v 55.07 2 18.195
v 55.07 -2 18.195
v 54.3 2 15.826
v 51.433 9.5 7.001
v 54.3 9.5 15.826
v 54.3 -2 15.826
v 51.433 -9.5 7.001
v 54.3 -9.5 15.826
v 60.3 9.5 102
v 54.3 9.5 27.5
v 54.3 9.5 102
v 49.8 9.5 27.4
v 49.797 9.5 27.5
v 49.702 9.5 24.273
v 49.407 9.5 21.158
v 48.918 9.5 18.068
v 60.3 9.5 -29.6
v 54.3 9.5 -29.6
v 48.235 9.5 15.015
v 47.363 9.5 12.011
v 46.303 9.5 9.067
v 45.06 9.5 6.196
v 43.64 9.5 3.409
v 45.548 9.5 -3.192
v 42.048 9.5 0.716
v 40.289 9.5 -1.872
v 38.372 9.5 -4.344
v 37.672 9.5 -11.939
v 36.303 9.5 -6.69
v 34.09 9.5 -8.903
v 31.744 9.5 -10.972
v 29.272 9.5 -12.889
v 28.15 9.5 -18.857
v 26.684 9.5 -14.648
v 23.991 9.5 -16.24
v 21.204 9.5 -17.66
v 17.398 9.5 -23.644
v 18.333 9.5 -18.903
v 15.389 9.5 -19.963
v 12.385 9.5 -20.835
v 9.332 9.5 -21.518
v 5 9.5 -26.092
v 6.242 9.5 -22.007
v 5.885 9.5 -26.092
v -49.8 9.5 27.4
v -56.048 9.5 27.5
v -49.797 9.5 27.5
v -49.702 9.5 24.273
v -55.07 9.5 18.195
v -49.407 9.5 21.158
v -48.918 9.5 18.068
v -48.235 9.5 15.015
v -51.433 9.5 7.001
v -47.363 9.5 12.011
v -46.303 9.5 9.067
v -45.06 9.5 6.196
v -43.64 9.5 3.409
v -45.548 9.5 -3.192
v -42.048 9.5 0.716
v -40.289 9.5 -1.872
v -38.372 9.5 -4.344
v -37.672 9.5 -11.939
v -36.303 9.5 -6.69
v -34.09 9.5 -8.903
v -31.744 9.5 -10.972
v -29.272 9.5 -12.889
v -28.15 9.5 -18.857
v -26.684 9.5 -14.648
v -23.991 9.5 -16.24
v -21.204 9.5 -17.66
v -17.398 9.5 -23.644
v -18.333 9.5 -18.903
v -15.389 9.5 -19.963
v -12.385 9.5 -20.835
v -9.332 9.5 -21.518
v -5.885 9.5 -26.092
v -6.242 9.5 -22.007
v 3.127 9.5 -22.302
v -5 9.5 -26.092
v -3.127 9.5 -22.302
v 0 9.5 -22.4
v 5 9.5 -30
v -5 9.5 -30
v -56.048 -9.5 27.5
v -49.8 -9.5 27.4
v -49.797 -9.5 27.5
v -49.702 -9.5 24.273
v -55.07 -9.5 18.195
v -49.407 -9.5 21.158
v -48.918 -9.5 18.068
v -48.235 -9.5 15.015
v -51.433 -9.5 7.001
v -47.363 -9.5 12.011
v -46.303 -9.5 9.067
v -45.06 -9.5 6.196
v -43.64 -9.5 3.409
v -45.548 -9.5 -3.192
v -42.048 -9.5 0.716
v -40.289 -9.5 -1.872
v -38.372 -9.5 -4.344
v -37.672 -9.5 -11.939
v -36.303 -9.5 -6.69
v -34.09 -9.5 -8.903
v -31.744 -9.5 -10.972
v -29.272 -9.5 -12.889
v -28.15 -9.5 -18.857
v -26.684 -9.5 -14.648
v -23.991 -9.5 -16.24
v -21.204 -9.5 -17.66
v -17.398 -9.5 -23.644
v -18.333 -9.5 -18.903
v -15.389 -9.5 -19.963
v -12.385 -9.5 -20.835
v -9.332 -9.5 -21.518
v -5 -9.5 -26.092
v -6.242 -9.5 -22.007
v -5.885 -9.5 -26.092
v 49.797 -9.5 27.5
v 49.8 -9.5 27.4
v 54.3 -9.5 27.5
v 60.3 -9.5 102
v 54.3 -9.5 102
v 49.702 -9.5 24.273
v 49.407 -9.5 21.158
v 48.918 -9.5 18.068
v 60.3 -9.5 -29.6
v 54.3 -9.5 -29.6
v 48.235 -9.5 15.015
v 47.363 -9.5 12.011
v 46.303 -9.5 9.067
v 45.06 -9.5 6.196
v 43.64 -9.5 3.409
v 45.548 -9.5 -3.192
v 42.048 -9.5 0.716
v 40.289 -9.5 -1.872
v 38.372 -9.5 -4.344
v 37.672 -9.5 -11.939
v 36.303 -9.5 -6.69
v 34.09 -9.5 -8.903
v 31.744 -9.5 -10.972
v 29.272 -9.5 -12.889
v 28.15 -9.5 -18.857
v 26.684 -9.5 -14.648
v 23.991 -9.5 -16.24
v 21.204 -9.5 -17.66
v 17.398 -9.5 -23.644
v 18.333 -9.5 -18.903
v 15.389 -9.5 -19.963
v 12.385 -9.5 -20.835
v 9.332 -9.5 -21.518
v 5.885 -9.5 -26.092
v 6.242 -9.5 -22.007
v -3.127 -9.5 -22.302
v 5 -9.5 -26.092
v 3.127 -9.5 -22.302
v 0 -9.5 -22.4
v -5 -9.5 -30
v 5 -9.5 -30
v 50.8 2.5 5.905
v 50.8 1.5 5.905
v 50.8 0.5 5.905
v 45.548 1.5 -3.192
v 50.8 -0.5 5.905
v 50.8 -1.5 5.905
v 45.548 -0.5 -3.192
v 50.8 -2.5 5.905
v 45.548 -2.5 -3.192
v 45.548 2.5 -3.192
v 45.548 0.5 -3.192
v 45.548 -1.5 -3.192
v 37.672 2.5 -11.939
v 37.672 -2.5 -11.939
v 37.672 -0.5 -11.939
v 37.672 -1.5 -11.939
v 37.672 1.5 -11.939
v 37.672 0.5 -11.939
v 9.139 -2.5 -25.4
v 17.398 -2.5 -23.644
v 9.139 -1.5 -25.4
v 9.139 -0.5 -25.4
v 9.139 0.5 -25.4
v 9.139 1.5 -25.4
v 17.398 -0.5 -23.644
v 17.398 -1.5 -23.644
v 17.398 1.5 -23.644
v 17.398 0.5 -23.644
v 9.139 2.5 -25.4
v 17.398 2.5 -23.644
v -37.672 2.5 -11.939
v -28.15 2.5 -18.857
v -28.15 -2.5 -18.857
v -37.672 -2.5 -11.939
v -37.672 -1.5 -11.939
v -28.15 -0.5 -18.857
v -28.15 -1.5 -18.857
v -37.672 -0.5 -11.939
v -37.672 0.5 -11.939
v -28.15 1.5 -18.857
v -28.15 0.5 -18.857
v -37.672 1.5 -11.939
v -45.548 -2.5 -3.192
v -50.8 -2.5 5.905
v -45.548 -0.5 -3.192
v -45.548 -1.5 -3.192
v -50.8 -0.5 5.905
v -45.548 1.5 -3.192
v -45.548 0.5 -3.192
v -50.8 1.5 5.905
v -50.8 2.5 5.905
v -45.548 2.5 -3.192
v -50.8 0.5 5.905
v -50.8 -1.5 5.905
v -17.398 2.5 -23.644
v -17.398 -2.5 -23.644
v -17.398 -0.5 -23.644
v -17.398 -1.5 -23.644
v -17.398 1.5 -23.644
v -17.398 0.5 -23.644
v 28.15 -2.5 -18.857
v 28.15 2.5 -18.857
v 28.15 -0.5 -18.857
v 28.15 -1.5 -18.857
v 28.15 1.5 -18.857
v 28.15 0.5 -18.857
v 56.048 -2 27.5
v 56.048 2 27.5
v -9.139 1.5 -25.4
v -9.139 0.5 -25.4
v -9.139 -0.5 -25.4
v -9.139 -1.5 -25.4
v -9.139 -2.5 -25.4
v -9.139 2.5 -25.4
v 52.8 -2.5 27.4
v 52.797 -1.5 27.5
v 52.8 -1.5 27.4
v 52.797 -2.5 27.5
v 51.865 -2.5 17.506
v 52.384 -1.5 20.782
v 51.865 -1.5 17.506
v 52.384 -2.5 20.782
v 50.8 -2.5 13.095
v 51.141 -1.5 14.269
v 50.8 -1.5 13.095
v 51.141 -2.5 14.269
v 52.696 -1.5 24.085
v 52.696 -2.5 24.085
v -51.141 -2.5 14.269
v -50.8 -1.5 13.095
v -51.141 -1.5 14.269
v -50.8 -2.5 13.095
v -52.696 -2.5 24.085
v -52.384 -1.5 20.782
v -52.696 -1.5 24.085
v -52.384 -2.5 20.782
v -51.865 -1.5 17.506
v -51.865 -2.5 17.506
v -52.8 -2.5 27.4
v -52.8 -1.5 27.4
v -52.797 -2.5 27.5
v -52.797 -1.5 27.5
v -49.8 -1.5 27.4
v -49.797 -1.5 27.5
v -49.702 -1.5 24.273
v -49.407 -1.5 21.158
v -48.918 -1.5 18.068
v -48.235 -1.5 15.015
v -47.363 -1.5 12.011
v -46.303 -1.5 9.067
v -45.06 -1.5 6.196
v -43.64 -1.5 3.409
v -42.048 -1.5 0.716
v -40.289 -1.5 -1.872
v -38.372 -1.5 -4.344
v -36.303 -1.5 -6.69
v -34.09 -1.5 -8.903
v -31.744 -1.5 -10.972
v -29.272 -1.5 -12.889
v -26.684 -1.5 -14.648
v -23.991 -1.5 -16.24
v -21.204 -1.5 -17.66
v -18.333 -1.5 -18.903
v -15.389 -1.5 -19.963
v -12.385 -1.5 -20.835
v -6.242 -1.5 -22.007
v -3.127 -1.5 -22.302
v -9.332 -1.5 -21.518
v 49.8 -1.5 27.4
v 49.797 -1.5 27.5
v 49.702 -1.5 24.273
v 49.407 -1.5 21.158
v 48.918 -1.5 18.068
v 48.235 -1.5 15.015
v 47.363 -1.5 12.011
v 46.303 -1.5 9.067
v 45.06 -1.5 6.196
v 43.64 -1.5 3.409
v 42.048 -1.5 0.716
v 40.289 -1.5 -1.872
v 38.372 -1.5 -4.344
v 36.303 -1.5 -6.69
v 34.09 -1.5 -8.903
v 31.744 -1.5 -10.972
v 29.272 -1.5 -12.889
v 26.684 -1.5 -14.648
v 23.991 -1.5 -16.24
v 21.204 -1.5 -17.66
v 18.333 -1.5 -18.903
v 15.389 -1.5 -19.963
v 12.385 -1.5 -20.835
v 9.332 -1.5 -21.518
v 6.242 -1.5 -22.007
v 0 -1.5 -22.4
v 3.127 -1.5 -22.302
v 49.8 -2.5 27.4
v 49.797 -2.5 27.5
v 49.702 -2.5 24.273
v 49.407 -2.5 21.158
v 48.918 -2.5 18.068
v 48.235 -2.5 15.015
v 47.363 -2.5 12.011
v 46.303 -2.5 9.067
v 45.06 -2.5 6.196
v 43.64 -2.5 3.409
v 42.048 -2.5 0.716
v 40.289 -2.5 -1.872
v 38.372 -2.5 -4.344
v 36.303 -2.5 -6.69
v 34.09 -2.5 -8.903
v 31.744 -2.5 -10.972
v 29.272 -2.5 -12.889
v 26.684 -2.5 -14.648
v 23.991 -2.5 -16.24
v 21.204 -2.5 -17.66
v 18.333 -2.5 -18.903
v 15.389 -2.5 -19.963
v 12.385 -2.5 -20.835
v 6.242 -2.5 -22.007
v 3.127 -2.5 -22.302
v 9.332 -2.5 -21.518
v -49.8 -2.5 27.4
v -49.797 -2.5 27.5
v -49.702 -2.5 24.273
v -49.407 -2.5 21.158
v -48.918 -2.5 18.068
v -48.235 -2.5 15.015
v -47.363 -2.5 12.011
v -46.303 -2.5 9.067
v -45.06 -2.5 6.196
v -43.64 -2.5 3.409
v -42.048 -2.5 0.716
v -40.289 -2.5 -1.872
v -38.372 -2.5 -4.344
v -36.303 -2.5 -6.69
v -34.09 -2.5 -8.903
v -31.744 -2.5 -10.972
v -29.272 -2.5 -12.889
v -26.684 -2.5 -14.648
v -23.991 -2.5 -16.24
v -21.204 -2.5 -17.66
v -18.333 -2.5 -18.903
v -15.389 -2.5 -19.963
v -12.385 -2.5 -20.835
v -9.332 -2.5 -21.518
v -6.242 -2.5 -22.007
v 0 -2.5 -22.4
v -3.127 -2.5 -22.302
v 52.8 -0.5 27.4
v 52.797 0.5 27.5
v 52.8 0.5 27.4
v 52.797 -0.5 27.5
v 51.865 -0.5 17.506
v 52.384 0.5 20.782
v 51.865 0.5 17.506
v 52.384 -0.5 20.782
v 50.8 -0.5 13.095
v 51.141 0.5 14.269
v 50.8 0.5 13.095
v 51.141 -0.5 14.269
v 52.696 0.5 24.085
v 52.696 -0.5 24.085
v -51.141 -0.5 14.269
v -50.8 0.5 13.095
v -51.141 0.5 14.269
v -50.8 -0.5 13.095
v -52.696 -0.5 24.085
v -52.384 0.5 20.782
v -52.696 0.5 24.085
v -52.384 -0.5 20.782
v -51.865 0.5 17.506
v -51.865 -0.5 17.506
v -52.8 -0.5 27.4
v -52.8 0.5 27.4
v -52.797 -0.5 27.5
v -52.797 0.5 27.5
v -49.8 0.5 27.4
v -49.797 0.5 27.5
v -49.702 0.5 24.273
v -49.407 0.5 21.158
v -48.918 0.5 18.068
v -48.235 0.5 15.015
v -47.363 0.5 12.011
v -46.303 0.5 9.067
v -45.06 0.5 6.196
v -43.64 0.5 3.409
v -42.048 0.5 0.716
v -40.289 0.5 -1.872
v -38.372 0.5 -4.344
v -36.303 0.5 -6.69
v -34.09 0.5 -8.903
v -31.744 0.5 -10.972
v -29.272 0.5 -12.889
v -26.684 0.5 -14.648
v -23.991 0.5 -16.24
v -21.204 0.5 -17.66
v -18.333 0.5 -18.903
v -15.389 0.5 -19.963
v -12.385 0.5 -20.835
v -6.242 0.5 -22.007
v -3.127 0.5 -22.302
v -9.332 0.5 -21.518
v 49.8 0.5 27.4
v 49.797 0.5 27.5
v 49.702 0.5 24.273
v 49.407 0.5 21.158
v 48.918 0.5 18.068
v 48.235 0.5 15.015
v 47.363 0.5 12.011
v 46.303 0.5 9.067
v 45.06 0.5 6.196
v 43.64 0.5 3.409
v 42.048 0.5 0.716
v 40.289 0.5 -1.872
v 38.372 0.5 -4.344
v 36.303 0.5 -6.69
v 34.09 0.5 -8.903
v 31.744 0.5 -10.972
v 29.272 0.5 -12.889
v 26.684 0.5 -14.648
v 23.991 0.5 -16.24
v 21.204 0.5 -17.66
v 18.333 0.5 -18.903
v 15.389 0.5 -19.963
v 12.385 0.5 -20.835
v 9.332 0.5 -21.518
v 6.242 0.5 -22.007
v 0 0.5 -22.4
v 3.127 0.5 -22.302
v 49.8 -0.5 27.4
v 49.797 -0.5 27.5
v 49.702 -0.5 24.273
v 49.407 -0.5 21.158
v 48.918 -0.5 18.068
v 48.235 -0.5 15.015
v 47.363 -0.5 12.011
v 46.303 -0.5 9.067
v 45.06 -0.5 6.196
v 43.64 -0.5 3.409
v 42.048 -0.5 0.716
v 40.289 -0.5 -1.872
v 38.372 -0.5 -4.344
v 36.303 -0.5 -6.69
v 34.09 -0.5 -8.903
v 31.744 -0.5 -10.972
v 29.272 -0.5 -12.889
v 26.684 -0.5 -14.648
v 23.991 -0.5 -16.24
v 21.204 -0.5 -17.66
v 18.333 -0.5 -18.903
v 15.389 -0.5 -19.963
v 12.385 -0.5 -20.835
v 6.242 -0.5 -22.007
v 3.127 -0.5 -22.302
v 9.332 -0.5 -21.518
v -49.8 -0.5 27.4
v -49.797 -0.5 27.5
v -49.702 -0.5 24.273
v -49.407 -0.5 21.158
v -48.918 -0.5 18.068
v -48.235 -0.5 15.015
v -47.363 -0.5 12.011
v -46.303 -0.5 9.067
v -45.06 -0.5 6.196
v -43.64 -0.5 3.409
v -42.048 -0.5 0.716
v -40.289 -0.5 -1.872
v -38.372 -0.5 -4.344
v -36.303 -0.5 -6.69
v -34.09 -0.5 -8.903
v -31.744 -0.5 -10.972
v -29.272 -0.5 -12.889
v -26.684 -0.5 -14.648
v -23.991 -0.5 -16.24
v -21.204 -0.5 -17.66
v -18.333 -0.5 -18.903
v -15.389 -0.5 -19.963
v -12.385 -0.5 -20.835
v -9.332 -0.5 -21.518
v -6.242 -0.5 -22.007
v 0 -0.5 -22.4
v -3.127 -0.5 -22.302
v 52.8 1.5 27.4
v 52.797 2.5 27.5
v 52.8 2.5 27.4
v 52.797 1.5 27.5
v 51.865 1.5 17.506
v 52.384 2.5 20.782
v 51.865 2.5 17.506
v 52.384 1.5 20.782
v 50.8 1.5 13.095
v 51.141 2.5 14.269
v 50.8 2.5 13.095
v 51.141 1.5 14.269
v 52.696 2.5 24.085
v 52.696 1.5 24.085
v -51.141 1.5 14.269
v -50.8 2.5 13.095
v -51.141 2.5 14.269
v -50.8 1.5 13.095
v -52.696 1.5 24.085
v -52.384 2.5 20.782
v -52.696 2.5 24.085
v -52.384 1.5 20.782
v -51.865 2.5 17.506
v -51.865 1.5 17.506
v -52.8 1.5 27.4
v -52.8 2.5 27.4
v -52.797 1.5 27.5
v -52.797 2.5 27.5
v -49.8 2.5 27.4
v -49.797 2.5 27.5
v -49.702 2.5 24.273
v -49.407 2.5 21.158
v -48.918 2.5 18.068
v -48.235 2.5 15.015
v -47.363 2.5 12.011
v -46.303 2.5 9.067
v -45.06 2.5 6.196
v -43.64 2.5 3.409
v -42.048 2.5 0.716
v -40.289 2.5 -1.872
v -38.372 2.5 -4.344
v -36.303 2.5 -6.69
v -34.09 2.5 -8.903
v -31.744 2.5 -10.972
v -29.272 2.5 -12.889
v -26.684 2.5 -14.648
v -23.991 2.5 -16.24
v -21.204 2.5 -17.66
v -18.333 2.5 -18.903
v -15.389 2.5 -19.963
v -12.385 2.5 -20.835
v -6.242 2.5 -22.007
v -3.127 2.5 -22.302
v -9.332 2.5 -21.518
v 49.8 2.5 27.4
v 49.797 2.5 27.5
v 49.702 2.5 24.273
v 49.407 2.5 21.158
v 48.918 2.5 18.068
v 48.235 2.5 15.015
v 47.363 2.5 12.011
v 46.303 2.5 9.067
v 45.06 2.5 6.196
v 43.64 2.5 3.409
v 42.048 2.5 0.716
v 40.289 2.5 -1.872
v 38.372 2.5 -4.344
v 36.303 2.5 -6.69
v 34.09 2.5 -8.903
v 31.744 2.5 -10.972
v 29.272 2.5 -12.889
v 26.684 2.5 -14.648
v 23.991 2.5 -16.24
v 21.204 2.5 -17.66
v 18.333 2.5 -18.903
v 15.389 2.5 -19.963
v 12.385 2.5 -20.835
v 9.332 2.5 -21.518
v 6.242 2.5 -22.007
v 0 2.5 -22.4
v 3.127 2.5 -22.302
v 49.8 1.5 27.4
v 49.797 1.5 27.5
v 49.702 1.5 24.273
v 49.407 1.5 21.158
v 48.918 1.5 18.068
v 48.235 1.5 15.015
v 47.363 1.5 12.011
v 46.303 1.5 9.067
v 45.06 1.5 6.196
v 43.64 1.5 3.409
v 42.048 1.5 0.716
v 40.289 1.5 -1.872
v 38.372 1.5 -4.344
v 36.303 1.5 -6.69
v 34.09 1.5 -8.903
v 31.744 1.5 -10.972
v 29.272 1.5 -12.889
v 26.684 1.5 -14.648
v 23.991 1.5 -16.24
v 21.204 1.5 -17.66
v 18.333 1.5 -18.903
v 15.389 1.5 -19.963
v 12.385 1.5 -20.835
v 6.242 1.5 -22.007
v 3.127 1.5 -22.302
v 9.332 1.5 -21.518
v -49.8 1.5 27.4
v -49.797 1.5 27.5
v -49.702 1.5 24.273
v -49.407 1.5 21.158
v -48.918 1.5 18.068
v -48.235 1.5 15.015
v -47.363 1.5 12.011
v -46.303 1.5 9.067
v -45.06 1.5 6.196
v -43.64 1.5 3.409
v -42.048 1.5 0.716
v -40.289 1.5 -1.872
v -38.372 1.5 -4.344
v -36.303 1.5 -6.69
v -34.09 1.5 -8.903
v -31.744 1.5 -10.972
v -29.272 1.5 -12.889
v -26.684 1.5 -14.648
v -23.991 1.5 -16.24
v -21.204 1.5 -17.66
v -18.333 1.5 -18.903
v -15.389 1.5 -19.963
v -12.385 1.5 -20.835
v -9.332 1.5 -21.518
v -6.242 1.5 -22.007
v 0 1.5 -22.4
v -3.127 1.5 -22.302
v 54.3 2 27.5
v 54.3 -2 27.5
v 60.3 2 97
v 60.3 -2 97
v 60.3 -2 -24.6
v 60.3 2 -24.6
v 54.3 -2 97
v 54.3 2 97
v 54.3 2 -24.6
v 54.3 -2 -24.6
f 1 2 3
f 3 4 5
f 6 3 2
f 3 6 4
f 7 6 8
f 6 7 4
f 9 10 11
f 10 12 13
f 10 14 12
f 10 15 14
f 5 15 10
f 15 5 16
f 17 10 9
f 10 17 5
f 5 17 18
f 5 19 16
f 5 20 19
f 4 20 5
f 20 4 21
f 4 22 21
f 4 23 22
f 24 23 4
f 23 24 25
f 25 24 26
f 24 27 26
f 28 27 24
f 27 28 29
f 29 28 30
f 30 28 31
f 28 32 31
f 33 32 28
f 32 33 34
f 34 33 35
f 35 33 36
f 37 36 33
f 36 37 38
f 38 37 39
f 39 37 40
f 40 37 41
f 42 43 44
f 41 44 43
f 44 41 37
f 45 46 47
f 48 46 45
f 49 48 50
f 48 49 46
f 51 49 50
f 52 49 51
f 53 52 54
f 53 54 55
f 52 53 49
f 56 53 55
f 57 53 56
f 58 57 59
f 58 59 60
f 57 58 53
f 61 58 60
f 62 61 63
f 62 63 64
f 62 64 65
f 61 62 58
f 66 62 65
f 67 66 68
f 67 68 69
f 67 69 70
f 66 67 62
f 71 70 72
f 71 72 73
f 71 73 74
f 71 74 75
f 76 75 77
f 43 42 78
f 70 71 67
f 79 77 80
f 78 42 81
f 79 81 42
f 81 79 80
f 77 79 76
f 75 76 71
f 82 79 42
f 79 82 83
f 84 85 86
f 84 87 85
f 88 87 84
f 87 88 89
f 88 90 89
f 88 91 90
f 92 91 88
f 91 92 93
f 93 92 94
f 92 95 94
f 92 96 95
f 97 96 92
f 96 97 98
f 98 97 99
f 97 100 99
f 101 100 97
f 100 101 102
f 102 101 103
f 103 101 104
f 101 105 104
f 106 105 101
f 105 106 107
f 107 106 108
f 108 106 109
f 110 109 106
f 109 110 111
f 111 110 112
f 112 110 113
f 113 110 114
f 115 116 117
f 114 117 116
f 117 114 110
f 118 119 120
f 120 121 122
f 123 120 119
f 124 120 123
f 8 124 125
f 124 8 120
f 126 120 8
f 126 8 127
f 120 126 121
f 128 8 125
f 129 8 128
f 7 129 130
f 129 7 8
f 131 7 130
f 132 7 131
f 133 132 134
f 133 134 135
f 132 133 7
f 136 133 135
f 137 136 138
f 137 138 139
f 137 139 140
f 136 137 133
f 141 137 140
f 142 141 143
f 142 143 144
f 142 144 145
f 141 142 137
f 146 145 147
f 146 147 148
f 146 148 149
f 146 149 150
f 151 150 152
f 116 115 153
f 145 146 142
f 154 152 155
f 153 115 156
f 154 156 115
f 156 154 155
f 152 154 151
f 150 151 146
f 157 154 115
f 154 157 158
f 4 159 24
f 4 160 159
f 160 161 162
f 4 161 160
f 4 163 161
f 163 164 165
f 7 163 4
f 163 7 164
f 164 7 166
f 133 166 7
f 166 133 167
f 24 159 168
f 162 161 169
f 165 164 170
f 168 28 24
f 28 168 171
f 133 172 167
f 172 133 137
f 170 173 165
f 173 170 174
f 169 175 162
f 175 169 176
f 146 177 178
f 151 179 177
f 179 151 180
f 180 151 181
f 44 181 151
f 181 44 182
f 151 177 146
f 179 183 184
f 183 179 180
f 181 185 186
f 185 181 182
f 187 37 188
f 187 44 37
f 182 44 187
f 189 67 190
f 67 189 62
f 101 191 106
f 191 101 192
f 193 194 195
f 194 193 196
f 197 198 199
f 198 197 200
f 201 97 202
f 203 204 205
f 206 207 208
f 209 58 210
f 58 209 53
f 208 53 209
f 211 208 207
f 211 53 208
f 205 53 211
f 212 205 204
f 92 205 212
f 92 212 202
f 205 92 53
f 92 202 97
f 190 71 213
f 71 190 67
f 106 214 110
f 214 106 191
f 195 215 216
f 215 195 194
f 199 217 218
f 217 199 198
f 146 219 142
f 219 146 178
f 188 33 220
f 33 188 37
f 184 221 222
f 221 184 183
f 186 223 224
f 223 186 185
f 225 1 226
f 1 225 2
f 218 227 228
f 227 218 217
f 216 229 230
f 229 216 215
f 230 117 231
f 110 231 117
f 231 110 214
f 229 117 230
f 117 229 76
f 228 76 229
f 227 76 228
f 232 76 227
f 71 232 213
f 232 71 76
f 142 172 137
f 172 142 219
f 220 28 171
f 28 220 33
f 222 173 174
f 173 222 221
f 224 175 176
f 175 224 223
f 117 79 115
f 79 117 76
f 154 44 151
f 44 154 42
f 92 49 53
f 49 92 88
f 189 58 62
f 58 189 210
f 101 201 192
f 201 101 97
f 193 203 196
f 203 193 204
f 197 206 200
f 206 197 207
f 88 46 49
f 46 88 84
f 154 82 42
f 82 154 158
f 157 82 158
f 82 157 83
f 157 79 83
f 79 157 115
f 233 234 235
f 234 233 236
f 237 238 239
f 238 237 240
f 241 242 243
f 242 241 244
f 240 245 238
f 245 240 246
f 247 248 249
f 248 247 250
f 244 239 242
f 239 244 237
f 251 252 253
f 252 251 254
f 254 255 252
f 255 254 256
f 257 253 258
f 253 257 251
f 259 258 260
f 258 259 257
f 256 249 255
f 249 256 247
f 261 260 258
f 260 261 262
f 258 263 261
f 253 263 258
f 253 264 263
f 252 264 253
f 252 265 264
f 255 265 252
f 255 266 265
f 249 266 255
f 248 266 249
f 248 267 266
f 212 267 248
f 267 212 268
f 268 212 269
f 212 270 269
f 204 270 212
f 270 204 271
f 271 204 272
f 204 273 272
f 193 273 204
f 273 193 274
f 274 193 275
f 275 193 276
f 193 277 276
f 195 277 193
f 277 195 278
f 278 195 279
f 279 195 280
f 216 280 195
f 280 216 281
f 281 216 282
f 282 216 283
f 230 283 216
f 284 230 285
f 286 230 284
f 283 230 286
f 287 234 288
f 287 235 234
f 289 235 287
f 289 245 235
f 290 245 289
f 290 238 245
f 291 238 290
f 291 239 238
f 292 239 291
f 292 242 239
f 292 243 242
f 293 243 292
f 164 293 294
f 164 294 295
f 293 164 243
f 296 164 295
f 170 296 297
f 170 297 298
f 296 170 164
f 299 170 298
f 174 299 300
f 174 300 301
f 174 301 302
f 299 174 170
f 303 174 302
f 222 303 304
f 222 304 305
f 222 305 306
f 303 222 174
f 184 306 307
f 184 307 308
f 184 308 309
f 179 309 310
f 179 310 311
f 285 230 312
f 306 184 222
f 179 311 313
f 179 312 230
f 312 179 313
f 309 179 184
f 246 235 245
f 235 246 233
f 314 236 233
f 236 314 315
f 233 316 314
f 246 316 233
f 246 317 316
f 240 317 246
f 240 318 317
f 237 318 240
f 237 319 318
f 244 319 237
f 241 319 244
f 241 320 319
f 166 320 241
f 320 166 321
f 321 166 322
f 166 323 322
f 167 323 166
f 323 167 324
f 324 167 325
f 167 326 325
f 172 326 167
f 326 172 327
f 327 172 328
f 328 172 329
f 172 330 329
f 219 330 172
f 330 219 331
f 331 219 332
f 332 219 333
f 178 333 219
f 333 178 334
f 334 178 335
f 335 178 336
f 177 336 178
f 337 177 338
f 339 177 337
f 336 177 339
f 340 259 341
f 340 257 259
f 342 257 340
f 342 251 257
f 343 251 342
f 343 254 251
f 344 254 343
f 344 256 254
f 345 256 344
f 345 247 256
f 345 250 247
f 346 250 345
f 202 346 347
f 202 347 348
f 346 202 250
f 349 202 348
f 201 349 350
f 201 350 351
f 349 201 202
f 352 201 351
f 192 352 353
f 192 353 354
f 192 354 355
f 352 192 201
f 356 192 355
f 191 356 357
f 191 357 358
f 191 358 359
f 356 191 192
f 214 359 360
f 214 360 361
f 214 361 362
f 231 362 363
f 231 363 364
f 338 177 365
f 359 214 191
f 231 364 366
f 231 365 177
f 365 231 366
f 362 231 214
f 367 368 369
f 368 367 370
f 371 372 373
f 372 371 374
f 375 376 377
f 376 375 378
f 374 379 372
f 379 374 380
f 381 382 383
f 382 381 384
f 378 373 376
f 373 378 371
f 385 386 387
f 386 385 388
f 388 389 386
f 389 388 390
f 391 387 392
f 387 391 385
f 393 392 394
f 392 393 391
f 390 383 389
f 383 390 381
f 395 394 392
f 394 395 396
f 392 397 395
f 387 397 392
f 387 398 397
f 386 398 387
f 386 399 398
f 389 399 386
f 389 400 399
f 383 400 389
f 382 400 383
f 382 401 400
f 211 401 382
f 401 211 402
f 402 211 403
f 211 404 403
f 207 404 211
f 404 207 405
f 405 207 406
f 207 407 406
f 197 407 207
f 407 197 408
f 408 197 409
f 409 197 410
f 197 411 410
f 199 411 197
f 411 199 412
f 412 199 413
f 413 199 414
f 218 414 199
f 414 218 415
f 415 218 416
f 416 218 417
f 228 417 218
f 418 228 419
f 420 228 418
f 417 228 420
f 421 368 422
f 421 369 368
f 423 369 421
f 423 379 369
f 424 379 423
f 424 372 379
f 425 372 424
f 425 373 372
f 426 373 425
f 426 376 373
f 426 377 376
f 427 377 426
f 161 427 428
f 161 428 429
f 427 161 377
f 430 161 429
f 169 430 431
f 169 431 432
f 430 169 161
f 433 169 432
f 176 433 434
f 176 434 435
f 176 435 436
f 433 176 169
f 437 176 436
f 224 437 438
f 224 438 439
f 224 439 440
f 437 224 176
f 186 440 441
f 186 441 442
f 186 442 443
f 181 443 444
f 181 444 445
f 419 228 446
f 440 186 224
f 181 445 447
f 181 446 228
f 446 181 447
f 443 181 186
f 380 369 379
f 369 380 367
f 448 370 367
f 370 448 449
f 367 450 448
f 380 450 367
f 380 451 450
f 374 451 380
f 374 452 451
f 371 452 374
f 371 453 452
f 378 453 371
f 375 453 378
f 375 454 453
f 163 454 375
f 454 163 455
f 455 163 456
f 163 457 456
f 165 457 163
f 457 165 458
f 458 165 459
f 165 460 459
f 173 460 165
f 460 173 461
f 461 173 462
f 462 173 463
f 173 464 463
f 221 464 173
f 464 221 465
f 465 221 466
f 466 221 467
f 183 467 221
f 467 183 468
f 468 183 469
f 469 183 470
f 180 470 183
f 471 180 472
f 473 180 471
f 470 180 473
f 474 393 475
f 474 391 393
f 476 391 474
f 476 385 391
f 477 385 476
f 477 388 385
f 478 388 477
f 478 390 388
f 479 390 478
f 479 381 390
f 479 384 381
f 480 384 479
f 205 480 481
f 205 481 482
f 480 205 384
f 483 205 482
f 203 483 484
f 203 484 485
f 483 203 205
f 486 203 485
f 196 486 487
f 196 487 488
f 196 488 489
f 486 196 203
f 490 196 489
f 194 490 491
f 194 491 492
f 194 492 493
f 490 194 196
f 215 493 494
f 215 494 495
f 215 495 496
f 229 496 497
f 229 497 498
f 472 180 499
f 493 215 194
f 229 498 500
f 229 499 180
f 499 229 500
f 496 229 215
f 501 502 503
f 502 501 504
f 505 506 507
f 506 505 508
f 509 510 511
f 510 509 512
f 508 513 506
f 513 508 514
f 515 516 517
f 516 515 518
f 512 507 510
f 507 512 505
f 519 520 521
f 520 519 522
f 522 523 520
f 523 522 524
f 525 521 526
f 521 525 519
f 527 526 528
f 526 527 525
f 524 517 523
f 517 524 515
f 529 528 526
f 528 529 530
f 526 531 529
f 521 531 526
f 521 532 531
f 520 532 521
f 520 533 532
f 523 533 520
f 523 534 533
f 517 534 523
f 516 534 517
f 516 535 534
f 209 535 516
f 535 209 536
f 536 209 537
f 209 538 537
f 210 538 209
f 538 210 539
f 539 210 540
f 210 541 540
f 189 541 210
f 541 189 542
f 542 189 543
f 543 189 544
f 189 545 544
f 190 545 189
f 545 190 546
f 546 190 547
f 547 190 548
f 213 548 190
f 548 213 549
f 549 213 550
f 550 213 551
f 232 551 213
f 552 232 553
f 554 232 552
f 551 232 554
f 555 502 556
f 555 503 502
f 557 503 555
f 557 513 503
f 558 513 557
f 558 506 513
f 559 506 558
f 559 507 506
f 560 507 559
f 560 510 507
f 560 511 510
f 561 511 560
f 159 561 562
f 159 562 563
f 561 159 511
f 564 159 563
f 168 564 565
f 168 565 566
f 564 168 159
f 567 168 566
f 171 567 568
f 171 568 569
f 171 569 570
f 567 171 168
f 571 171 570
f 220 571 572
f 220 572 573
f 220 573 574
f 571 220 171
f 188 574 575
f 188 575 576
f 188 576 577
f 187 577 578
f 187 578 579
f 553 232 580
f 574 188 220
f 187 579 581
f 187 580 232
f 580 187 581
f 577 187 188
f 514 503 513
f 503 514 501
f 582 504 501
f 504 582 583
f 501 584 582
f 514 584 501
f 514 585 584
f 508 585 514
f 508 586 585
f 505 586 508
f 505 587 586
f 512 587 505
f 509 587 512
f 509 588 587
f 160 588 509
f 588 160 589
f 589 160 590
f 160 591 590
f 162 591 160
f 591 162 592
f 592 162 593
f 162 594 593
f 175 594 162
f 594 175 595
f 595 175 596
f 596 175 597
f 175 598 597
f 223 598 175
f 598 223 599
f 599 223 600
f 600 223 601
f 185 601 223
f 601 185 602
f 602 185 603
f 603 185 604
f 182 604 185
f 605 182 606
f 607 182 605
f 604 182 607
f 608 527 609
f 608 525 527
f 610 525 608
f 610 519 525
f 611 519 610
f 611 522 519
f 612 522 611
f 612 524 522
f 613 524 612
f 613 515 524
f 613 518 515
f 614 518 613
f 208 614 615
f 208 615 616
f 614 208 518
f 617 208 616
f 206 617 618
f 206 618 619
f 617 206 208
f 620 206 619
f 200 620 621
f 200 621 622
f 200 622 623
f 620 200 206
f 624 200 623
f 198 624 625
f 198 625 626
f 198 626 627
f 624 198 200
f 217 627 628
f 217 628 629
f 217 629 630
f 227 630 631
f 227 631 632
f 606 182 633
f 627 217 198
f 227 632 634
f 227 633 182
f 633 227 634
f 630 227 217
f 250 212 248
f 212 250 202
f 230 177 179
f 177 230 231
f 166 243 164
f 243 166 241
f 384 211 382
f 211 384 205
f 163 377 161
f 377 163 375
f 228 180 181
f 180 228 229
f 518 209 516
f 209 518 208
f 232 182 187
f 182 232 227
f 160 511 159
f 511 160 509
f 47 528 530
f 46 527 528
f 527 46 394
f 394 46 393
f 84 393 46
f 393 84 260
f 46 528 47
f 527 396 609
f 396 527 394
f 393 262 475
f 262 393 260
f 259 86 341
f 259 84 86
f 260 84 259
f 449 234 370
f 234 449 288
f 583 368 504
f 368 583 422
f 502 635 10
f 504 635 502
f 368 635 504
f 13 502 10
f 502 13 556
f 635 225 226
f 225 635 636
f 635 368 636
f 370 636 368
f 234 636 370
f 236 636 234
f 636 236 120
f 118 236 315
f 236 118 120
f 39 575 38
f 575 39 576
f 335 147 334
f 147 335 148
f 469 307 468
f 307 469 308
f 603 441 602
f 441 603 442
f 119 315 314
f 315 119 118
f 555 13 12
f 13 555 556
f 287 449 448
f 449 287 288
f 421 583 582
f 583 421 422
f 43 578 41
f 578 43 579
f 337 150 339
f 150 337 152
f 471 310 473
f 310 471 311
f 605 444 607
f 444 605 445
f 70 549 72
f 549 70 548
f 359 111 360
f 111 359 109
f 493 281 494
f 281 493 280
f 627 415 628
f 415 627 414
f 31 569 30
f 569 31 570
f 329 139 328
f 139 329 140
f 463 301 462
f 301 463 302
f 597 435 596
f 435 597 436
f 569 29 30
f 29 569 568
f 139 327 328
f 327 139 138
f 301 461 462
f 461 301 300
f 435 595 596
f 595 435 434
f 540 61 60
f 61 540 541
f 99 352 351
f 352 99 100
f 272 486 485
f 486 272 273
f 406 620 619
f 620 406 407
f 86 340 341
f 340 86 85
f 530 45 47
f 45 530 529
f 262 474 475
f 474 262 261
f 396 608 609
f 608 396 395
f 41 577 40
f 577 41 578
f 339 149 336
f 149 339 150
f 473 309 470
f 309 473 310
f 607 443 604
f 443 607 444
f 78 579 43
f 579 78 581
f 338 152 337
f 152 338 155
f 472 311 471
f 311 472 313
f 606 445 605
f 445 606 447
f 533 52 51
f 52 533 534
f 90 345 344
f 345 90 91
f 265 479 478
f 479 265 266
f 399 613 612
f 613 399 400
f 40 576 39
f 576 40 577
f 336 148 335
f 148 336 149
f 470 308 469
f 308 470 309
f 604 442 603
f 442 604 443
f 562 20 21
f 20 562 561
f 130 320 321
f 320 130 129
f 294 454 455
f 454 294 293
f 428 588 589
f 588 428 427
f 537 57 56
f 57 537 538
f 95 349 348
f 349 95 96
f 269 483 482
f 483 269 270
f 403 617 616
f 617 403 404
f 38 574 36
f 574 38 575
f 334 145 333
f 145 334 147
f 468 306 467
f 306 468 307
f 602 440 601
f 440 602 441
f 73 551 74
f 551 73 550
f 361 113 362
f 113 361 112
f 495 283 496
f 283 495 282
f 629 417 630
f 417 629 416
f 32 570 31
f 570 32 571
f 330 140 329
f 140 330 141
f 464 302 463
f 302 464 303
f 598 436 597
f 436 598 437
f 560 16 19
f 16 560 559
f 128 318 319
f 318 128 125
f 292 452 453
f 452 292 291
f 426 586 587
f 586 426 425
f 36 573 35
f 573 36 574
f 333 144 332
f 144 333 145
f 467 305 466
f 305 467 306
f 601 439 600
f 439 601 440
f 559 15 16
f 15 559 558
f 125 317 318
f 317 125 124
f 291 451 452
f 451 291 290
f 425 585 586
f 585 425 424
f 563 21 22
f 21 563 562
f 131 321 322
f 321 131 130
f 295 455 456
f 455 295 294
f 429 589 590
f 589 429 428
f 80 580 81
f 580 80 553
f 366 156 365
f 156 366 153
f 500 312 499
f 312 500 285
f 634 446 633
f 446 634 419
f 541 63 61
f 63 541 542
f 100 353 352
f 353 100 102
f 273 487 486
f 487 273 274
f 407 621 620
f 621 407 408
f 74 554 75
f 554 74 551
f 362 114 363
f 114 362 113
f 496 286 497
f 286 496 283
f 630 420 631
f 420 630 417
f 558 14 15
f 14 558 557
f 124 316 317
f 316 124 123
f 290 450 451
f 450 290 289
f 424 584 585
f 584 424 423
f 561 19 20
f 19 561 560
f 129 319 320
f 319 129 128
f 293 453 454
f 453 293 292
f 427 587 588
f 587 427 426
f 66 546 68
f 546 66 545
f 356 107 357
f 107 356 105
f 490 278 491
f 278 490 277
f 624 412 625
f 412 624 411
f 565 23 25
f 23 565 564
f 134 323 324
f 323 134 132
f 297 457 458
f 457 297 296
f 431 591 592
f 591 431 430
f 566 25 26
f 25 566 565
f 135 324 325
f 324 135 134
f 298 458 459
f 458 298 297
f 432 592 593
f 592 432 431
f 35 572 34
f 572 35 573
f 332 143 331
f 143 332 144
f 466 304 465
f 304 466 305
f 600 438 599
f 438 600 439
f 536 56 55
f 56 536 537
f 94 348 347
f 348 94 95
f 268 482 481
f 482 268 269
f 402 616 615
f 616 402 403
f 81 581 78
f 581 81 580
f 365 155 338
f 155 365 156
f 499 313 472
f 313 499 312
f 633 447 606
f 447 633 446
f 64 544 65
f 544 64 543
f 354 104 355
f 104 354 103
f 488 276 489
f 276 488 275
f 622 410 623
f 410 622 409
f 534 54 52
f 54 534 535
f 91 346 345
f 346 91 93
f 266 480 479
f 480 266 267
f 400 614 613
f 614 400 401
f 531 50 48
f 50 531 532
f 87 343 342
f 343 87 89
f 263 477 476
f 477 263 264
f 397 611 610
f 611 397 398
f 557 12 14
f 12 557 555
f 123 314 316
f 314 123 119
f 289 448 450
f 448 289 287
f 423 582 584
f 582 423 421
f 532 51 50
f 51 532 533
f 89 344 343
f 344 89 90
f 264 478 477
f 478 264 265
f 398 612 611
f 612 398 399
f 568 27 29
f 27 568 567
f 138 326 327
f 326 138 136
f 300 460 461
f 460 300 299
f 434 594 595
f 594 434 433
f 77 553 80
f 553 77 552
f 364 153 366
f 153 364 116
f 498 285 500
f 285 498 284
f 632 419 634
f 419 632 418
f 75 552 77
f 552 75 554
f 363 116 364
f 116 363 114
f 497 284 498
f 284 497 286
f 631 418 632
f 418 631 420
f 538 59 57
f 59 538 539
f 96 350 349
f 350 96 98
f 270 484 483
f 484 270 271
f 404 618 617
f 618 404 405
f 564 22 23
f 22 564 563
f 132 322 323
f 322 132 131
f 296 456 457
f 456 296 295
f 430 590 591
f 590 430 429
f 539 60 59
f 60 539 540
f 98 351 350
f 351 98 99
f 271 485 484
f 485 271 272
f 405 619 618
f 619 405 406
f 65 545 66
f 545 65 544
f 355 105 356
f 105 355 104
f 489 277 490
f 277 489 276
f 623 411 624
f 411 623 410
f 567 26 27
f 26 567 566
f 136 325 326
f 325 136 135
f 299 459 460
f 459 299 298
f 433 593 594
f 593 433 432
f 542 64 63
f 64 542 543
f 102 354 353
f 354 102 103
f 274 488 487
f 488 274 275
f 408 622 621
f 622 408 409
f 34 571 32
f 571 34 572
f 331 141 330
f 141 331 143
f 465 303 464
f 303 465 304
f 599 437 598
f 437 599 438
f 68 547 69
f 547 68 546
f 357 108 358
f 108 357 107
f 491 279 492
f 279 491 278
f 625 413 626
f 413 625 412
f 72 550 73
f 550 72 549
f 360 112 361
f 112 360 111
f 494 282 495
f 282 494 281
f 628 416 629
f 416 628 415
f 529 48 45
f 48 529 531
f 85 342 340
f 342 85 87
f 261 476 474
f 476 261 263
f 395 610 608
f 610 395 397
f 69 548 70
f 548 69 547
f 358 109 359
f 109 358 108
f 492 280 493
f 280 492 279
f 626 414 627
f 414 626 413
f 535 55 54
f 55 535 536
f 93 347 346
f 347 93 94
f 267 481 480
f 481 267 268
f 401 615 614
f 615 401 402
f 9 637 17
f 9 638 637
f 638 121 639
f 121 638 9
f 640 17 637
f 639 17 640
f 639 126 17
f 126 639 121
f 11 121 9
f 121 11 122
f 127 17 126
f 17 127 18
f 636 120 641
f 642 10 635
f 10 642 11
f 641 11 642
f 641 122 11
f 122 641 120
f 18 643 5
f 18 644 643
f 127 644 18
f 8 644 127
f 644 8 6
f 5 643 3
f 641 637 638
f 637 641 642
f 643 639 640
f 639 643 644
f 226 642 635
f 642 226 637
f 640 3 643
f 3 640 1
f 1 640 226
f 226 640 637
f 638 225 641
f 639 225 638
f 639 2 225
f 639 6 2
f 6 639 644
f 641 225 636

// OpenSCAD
// Pankaj Deshmukh - Michigan Technological University - EE 5777
// 4" inch diameter circular/4" side square wafer silicon wafer holder for clean room 
// wafer cleaning

// Number of slides
slides = 2;

// Wafer thickness in mm
thickness = .5;

// 1 inch = 25.4 mm
inch = 25.4;

// size in inch
size = 4;
  
//Wafer diameter in mm
diameter = size*inch;

// Height for the holder
height = 65;

difference(){
   union(){
   translate([0, 0, (diameter/4)+4.5]) 
   rotate([90, 0, 0])
   cylinder(r = (diameter+11)/2,slides*(thickness+1.5)+15, center = true);
   
   translate([0,0,-25])
   cube([10,(slides*(thickness+1.5)+15),10],center = true);
   }  
   
   // cube for reducing the height
   translate([0, 0, (diameter/4)+35]) 
   cube([(diameter+15),slides*(thickness+1.5)+15,(diameter+30)/2], center = true);


   //Cylindrical cut
	translate([0, 0, (diameter/4)+2]) 
   {
	rotate([90, 0, 0]) {
	cylinder(r = (diameter/2)-1, h = slides*(thickness+1.5)+16, center = true, $fn = 100);
		}
	}
   
   // cuts for the circular wafers
   for(i=[0:1:slides])
	{
		translate([0,(i*(thickness+1.5))-slides,(diameter/4)+2])//(diameter/4)+2
       rotate([90, 0, 0])
       cylinder(r = (diameter/2)+2, h = thickness*2,center = true, $fn = 100);
	}

   // cuts for the square wafers
   for(i=[0:1:slides])
   {
   	translate([0,(i*(thickness+1.5))-slides,(diameter/4)])//(diameter/4)+2
     rotate([90, 0, 0])
     cube([diameter, diameter,thickness*2], center = true);
	}
}


difference(){
   // cube for handle
   union(){
   translate([(diameter/2)+6.5, 0, (3*diameter/4)-40])
   cube([6,slides*(thickness+1.5)+15,diameter+30], center = true);
   }
   
   // cube cut for handle
   translate([(diameter/2)+7.5, 0, (3*diameter/4)-40])
   cube([8,slides*(thickness+1.5),(diameter)+20], center = true);
}
